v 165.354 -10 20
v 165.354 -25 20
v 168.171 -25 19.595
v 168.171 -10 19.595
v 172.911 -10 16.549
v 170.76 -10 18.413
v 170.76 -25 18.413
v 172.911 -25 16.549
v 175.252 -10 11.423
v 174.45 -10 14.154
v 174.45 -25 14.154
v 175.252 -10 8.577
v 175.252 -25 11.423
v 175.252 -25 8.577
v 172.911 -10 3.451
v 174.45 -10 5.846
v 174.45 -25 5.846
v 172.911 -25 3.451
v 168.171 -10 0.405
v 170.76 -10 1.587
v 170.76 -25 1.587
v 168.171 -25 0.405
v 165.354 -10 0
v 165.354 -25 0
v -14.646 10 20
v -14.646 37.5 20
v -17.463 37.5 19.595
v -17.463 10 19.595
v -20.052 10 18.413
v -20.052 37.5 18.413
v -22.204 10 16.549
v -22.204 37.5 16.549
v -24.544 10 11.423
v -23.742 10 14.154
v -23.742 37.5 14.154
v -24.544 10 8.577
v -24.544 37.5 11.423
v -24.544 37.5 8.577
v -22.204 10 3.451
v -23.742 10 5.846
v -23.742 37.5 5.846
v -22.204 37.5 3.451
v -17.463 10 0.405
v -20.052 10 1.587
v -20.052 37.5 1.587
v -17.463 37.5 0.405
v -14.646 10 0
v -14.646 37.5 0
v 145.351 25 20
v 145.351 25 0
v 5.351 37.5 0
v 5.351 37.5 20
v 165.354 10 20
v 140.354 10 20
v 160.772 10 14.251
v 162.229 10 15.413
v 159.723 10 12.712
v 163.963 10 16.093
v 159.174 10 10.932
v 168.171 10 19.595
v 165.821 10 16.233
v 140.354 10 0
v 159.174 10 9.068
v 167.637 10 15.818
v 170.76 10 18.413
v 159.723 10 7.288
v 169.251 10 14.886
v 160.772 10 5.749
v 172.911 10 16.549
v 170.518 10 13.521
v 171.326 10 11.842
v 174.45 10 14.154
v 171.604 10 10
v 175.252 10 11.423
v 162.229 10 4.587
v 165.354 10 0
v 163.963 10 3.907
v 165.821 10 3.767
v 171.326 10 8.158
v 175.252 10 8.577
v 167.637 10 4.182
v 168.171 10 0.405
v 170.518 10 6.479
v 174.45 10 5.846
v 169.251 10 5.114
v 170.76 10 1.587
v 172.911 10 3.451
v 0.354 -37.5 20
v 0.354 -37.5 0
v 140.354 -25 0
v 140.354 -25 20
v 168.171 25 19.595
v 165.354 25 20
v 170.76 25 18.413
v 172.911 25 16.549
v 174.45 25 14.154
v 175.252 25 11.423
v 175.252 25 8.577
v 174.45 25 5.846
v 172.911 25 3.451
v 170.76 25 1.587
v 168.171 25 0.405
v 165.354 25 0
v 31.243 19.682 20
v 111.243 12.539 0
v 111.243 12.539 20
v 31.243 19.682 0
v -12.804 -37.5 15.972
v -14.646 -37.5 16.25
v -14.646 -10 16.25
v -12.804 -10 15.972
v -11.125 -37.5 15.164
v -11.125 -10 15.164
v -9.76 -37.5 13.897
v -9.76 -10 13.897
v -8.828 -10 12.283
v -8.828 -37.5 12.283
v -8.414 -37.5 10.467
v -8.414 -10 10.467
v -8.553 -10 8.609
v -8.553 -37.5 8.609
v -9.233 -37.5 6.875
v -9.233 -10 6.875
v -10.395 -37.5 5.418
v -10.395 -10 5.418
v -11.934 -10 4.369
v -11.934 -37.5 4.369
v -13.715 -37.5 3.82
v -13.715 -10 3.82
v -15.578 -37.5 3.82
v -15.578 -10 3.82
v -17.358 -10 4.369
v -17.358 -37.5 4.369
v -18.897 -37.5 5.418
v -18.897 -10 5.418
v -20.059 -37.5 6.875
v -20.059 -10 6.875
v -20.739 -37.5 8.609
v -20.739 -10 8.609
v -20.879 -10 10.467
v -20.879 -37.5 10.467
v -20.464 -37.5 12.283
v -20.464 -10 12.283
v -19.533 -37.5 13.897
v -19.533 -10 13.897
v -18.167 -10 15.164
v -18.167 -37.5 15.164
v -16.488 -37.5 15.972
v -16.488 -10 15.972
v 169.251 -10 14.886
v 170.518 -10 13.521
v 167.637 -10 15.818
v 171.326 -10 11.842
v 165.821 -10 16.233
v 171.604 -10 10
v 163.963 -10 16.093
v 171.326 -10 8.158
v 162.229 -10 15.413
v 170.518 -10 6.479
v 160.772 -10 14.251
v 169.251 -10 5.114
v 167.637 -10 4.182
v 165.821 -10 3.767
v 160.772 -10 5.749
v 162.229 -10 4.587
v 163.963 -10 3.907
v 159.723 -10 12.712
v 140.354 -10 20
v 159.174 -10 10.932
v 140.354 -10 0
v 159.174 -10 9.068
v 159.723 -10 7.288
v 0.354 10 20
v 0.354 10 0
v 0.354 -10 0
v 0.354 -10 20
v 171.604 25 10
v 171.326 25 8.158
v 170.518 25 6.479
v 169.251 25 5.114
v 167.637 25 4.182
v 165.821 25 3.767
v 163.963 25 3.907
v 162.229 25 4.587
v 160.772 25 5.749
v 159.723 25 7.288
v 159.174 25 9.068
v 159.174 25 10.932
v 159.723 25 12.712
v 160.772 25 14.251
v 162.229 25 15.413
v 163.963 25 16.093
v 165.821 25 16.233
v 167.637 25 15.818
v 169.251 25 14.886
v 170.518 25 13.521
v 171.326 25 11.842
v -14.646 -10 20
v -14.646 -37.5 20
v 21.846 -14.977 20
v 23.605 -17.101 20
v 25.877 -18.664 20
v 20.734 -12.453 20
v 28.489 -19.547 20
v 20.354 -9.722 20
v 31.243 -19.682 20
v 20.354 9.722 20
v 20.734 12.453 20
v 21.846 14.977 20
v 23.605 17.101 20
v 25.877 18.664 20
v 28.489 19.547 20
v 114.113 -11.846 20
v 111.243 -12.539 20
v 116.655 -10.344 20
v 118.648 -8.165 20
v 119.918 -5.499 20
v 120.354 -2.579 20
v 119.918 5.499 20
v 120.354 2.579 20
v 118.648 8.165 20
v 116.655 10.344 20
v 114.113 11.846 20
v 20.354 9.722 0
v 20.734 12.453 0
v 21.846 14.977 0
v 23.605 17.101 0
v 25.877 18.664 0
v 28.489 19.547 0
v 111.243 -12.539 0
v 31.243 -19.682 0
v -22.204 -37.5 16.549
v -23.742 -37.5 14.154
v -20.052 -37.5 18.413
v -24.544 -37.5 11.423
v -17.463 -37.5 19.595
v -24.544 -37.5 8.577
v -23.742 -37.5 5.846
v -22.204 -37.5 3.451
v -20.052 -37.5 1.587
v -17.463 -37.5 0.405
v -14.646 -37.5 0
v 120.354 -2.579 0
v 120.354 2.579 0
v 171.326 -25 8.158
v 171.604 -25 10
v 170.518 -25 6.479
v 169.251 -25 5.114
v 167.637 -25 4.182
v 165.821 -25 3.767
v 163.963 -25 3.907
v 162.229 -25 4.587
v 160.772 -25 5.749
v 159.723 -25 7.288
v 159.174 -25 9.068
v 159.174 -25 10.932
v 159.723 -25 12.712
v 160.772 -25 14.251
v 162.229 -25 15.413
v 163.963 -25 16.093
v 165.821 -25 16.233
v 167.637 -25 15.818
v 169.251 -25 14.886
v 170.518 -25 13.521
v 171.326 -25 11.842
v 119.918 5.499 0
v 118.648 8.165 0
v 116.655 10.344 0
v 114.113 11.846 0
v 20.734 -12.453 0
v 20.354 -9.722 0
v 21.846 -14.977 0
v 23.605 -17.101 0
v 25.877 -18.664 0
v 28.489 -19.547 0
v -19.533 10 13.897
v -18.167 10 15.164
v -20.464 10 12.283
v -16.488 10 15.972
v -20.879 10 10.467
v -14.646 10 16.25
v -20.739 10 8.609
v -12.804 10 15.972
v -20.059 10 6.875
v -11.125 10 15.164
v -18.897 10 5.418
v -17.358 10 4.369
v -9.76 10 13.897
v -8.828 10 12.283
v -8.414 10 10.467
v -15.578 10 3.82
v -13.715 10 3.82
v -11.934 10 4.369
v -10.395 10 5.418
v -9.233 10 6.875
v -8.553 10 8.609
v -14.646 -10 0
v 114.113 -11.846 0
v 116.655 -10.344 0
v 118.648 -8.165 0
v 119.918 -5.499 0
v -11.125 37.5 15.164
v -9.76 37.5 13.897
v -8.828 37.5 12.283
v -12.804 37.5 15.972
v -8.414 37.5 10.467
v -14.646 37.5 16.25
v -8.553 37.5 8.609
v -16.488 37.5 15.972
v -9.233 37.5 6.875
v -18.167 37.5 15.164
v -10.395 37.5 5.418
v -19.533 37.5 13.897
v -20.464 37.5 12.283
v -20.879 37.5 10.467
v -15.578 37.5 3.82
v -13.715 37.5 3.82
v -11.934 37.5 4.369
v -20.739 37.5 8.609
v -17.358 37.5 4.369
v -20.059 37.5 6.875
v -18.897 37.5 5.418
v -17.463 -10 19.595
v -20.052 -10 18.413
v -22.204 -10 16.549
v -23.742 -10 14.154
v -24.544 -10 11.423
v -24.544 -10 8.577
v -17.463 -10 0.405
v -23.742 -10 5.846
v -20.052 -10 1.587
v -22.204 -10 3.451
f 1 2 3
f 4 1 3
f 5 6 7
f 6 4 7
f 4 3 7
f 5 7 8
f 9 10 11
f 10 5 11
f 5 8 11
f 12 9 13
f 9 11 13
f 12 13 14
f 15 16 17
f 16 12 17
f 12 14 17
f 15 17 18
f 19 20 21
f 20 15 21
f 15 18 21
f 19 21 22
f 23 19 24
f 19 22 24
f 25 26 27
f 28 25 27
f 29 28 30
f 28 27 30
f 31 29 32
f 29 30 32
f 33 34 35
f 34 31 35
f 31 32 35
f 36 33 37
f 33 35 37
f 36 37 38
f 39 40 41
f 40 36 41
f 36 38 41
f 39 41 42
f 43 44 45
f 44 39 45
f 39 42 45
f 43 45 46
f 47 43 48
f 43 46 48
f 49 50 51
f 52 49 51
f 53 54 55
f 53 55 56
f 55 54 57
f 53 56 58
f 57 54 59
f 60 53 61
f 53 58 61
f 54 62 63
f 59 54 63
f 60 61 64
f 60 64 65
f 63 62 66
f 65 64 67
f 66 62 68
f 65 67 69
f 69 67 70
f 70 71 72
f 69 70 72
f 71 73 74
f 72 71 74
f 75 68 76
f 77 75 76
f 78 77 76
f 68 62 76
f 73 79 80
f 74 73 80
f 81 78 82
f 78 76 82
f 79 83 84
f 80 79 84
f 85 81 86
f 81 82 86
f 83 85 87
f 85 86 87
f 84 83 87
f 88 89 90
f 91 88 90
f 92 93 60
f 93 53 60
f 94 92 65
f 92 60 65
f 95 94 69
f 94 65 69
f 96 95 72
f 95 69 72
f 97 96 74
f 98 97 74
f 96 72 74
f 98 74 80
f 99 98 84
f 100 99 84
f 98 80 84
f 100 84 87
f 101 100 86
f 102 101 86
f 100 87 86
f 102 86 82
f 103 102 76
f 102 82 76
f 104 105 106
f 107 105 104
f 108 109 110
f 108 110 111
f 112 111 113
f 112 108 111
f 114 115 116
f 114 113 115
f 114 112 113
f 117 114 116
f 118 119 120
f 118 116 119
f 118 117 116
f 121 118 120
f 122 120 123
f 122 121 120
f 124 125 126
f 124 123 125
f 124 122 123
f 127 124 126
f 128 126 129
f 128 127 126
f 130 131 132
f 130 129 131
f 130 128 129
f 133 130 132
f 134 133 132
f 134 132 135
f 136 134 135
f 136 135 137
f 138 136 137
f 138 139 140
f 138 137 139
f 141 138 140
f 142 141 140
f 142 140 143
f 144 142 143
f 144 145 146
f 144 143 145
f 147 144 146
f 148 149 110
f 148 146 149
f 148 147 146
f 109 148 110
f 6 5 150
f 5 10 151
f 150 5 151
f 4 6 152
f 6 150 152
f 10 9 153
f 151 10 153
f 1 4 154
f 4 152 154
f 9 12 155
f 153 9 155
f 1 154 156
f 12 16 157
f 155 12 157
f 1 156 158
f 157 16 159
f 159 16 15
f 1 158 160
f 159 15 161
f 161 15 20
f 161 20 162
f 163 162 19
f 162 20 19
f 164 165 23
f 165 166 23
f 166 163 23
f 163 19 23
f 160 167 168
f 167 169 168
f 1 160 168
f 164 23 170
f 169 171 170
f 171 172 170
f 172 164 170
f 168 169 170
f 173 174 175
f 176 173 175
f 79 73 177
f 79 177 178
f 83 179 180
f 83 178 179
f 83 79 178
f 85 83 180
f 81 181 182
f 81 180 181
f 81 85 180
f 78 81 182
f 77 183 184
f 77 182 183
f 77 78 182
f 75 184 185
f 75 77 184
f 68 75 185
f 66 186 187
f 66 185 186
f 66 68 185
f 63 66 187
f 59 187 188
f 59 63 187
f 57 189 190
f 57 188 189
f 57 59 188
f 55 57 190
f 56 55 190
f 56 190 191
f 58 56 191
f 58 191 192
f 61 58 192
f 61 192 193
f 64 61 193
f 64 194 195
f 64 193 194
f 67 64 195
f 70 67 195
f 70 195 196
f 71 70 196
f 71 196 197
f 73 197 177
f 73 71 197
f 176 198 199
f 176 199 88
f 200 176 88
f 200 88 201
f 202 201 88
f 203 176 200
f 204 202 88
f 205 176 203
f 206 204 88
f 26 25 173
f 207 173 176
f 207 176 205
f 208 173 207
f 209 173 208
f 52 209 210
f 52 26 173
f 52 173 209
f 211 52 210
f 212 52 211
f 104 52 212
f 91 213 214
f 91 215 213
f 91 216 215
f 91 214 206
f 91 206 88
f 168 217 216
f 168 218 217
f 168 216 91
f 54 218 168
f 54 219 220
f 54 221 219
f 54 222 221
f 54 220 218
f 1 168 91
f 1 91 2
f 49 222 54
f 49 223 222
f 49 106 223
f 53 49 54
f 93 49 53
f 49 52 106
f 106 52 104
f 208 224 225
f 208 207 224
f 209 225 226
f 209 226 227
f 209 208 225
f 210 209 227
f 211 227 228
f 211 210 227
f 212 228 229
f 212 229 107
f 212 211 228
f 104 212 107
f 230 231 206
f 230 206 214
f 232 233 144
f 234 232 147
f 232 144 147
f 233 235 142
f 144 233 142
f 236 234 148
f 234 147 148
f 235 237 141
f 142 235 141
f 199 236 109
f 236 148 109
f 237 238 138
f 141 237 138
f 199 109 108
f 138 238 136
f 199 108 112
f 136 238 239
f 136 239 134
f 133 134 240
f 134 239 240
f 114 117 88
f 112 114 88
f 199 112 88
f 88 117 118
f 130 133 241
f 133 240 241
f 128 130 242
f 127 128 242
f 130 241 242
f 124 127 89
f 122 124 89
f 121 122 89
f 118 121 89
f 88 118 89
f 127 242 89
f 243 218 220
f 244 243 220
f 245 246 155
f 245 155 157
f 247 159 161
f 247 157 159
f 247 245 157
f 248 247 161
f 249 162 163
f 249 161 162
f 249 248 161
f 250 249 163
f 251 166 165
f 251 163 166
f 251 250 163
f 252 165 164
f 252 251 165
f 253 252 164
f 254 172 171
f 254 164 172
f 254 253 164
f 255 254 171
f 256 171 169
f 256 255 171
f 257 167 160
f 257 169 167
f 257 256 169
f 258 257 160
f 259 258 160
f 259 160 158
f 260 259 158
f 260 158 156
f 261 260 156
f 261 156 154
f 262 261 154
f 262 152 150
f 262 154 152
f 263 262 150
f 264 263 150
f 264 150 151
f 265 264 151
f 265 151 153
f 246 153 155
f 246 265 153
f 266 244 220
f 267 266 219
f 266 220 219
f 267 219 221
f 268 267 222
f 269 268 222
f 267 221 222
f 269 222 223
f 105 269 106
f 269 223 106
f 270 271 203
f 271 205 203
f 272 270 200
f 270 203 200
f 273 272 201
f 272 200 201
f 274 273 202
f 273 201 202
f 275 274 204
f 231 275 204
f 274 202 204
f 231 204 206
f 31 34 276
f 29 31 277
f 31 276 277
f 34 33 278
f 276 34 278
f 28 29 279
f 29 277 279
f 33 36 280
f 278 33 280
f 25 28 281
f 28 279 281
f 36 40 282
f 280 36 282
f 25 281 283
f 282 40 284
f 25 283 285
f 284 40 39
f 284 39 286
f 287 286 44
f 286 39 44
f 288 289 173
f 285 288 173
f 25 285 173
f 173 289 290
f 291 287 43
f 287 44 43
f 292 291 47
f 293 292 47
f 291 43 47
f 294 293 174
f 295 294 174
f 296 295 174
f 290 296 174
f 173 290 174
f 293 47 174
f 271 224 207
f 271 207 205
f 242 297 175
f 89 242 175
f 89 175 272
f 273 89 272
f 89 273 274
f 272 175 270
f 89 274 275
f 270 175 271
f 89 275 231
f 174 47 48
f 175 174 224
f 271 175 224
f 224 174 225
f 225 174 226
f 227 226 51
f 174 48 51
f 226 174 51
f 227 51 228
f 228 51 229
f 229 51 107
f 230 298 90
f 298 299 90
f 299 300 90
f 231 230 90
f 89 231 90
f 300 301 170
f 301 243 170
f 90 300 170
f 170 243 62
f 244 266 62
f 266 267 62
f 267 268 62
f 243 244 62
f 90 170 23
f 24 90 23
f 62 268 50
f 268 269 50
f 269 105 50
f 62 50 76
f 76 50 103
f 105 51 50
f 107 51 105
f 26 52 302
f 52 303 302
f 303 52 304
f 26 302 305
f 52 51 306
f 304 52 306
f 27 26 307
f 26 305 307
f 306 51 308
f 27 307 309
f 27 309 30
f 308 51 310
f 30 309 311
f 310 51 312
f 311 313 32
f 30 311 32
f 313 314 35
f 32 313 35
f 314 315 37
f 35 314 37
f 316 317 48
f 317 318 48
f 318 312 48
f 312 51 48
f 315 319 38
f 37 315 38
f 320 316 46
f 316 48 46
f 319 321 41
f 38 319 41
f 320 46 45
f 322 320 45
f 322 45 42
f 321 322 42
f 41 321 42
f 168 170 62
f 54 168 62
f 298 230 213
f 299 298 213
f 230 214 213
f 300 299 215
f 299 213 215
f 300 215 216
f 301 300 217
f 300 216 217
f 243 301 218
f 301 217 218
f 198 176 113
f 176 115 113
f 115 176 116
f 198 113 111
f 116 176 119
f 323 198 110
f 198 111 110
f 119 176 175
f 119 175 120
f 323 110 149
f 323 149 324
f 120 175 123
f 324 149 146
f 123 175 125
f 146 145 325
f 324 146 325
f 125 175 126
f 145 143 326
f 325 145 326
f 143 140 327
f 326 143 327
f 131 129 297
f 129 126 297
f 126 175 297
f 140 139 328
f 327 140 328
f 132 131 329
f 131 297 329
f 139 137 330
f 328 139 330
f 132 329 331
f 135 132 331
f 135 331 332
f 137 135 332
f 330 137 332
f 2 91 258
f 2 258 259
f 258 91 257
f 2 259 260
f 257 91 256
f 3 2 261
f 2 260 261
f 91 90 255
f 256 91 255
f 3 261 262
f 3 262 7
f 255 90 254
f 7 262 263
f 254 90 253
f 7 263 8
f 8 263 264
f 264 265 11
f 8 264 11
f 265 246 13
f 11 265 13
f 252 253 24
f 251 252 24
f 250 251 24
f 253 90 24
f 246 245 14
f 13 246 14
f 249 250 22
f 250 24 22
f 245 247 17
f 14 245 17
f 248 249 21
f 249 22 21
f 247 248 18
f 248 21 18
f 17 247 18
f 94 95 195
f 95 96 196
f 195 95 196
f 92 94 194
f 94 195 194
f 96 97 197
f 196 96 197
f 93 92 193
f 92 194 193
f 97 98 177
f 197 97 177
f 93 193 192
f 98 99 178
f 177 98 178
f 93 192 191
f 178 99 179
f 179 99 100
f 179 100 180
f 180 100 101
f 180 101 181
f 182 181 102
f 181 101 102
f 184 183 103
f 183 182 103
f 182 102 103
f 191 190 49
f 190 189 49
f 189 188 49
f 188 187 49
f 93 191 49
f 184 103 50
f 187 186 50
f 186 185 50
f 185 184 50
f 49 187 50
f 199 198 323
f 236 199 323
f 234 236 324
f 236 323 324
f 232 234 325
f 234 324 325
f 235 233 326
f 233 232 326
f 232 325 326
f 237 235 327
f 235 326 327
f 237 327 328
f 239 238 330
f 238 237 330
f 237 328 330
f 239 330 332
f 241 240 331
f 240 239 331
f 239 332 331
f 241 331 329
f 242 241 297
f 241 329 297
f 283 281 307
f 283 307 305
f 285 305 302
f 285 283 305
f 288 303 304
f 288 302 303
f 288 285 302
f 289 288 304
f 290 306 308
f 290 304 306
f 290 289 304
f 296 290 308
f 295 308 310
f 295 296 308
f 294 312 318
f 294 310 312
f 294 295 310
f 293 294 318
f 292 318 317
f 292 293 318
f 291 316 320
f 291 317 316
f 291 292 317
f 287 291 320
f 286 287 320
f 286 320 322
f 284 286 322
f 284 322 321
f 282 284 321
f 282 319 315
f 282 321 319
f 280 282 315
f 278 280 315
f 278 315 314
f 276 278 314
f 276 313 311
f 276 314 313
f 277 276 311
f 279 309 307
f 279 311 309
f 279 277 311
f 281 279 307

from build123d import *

# Parameters (mm, degrees)
BASE_EXTRUDE_DEPTH      = 20
FILLET1_R               = 10
FILLET2_R               = 10
CUT_EXTRUDE1_DEPTH      = 181.430735794
CUT_EXTRUDE1_DEPTH_BACK = 181.430735794
SKETCH4_R               = 6.25


with BuildPart() as part:
    # Sketch1 → Base-Extrude (new body)
    with BuildSketch(Plane.XY):
        Polygon((145.351370521, 25), (5.351370521, 37.5), (-24.64607099, 37.5), (-24.64607099, 10), (0.35392901, 10), (0.35392901, -10), (-24.64607099, -10), (-24.64607099, -37.5), (0.35392901, -37.5), (140.35392901, -25), (175.35392901, -25), (175.35392901, -10), (140.35392901, -10), (140.35392901, 10), (175.35392901, 10), (175.35392901, 25), align=None)
        Polygon((120.35392901, 11.726043432), (20.35392901, 20.65461486), (20.35392901, -20.65461486), (120.35392901, -11.726043432), align=None, mode=Mode.SUBTRACT)
    extrude(amount=BASE_EXTRUDE_DEPTH)

    # Fillet1
    # the kernel refuses this fillet: 10 mm, written as the material it takes off along each edge
    with BuildSketch(Plane(origin=(175.35392901, -15, 0), x_dir=(0, 0, 1), z_dir=(0, 1, 0)), Plane(origin=(175.35392901, -50, 0), x_dir=(0, 0, 1), z_dir=(0, 1, 0))) as fillet1_piece_1:
        with BuildLine():
            CenterArc((FILLET1_R, -FILLET1_R), FILLET1_R, 90, 90)
            Line((0, -FILLET1_R), (0, 0))
            Line((0, 0), (FILLET1_R, 0))
        make_face()
    extrude(amount=65, mode=Mode.SUBTRACT)
    with BuildSketch(Plane(origin=(-24.64607099, 15, 0), x_dir=(0, 0, 1), z_dir=(0, -1, 0)), Plane(origin=(-24.64607099, 62.5, 0), x_dir=(0, 0, 1), z_dir=(0, -1, 0))) as fillet1_piece_2:
        with BuildLine():
            CenterArc((FILLET1_R, -FILLET1_R), FILLET1_R, 90, 90)
            Line((0, -FILLET1_R), (0, 0))
            Line((0, 0), (FILLET1_R, 0))
        make_face()
    extrude(amount=77.5, mode=Mode.SUBTRACT)
    with BuildSketch(Plane(origin=(-24.64607099, 15, 20), x_dir=(0, 0, -1), z_dir=(0, -1, 0)), Plane(origin=(-24.64607099, 62.5, 20), x_dir=(0, 0, -1), z_dir=(0, -1, 0))) as fillet1_piece_3:
        with BuildLine():
            CenterArc((FILLET1_R, FILLET1_R), FILLET1_R, 180, 90)
            Line((0, FILLET1_R), (0, 0))
            Line((0, 0), (FILLET1_R, 0))
        make_face()
    extrude(amount=77.5, mode=Mode.SUBTRACT)
    with BuildSketch(Plane(origin=(175.35392901, -50, 20), x_dir=(0, 0, -1), z_dir=(0, 1, 0)), Plane(origin=(175.35392901, -15, 20), x_dir=(0, 0, -1), z_dir=(0, 1, 0))) as fillet1_piece_4:
        with BuildLine():
            CenterArc((FILLET1_R, FILLET1_R), FILLET1_R, 180, 90)
            Line((0, FILLET1_R), (0, 0))
            Line((0, 0), (FILLET1_R, 0))
        make_face()
    extrude(amount=65, mode=Mode.SUBTRACT)

    # Fillet2
    fillet2_edges = [part.edges().sort_by_distance(p)[0] for p in [
        (120.35392901, -11.726043432, 10),
        (120.35392901, 11.726043432, 10),
        (20.35392901, 20.65461486, 10),
        (20.35392901, -20.65461486, 10),
    ]]
    fillet(fillet2_edges, radius=FILLET2_R)

    # Sketch4 → Cut-Extrude1 (cut, two sides: drawn at the far end of the back side and taken through both)
    with BuildSketch(Plane(origin=(0, 0, 0), x_dir=(1, 0, 0), z_dir=(0, 1, 0)).offset(-CUT_EXTRUDE1_DEPTH_BACK)):
        with Locations((165.35392901, -10)):
            Circle(SKETCH4_R)
        with Locations(Location((-14.64607099, -10, 0), (0, 0, 270))):
            Circle(SKETCH4_R)
    extrude(amount=CUT_EXTRUDE1_DEPTH + CUT_EXTRUDE1_DEPTH_BACK, mode=Mode.SUBTRACT)


solid = part.part
